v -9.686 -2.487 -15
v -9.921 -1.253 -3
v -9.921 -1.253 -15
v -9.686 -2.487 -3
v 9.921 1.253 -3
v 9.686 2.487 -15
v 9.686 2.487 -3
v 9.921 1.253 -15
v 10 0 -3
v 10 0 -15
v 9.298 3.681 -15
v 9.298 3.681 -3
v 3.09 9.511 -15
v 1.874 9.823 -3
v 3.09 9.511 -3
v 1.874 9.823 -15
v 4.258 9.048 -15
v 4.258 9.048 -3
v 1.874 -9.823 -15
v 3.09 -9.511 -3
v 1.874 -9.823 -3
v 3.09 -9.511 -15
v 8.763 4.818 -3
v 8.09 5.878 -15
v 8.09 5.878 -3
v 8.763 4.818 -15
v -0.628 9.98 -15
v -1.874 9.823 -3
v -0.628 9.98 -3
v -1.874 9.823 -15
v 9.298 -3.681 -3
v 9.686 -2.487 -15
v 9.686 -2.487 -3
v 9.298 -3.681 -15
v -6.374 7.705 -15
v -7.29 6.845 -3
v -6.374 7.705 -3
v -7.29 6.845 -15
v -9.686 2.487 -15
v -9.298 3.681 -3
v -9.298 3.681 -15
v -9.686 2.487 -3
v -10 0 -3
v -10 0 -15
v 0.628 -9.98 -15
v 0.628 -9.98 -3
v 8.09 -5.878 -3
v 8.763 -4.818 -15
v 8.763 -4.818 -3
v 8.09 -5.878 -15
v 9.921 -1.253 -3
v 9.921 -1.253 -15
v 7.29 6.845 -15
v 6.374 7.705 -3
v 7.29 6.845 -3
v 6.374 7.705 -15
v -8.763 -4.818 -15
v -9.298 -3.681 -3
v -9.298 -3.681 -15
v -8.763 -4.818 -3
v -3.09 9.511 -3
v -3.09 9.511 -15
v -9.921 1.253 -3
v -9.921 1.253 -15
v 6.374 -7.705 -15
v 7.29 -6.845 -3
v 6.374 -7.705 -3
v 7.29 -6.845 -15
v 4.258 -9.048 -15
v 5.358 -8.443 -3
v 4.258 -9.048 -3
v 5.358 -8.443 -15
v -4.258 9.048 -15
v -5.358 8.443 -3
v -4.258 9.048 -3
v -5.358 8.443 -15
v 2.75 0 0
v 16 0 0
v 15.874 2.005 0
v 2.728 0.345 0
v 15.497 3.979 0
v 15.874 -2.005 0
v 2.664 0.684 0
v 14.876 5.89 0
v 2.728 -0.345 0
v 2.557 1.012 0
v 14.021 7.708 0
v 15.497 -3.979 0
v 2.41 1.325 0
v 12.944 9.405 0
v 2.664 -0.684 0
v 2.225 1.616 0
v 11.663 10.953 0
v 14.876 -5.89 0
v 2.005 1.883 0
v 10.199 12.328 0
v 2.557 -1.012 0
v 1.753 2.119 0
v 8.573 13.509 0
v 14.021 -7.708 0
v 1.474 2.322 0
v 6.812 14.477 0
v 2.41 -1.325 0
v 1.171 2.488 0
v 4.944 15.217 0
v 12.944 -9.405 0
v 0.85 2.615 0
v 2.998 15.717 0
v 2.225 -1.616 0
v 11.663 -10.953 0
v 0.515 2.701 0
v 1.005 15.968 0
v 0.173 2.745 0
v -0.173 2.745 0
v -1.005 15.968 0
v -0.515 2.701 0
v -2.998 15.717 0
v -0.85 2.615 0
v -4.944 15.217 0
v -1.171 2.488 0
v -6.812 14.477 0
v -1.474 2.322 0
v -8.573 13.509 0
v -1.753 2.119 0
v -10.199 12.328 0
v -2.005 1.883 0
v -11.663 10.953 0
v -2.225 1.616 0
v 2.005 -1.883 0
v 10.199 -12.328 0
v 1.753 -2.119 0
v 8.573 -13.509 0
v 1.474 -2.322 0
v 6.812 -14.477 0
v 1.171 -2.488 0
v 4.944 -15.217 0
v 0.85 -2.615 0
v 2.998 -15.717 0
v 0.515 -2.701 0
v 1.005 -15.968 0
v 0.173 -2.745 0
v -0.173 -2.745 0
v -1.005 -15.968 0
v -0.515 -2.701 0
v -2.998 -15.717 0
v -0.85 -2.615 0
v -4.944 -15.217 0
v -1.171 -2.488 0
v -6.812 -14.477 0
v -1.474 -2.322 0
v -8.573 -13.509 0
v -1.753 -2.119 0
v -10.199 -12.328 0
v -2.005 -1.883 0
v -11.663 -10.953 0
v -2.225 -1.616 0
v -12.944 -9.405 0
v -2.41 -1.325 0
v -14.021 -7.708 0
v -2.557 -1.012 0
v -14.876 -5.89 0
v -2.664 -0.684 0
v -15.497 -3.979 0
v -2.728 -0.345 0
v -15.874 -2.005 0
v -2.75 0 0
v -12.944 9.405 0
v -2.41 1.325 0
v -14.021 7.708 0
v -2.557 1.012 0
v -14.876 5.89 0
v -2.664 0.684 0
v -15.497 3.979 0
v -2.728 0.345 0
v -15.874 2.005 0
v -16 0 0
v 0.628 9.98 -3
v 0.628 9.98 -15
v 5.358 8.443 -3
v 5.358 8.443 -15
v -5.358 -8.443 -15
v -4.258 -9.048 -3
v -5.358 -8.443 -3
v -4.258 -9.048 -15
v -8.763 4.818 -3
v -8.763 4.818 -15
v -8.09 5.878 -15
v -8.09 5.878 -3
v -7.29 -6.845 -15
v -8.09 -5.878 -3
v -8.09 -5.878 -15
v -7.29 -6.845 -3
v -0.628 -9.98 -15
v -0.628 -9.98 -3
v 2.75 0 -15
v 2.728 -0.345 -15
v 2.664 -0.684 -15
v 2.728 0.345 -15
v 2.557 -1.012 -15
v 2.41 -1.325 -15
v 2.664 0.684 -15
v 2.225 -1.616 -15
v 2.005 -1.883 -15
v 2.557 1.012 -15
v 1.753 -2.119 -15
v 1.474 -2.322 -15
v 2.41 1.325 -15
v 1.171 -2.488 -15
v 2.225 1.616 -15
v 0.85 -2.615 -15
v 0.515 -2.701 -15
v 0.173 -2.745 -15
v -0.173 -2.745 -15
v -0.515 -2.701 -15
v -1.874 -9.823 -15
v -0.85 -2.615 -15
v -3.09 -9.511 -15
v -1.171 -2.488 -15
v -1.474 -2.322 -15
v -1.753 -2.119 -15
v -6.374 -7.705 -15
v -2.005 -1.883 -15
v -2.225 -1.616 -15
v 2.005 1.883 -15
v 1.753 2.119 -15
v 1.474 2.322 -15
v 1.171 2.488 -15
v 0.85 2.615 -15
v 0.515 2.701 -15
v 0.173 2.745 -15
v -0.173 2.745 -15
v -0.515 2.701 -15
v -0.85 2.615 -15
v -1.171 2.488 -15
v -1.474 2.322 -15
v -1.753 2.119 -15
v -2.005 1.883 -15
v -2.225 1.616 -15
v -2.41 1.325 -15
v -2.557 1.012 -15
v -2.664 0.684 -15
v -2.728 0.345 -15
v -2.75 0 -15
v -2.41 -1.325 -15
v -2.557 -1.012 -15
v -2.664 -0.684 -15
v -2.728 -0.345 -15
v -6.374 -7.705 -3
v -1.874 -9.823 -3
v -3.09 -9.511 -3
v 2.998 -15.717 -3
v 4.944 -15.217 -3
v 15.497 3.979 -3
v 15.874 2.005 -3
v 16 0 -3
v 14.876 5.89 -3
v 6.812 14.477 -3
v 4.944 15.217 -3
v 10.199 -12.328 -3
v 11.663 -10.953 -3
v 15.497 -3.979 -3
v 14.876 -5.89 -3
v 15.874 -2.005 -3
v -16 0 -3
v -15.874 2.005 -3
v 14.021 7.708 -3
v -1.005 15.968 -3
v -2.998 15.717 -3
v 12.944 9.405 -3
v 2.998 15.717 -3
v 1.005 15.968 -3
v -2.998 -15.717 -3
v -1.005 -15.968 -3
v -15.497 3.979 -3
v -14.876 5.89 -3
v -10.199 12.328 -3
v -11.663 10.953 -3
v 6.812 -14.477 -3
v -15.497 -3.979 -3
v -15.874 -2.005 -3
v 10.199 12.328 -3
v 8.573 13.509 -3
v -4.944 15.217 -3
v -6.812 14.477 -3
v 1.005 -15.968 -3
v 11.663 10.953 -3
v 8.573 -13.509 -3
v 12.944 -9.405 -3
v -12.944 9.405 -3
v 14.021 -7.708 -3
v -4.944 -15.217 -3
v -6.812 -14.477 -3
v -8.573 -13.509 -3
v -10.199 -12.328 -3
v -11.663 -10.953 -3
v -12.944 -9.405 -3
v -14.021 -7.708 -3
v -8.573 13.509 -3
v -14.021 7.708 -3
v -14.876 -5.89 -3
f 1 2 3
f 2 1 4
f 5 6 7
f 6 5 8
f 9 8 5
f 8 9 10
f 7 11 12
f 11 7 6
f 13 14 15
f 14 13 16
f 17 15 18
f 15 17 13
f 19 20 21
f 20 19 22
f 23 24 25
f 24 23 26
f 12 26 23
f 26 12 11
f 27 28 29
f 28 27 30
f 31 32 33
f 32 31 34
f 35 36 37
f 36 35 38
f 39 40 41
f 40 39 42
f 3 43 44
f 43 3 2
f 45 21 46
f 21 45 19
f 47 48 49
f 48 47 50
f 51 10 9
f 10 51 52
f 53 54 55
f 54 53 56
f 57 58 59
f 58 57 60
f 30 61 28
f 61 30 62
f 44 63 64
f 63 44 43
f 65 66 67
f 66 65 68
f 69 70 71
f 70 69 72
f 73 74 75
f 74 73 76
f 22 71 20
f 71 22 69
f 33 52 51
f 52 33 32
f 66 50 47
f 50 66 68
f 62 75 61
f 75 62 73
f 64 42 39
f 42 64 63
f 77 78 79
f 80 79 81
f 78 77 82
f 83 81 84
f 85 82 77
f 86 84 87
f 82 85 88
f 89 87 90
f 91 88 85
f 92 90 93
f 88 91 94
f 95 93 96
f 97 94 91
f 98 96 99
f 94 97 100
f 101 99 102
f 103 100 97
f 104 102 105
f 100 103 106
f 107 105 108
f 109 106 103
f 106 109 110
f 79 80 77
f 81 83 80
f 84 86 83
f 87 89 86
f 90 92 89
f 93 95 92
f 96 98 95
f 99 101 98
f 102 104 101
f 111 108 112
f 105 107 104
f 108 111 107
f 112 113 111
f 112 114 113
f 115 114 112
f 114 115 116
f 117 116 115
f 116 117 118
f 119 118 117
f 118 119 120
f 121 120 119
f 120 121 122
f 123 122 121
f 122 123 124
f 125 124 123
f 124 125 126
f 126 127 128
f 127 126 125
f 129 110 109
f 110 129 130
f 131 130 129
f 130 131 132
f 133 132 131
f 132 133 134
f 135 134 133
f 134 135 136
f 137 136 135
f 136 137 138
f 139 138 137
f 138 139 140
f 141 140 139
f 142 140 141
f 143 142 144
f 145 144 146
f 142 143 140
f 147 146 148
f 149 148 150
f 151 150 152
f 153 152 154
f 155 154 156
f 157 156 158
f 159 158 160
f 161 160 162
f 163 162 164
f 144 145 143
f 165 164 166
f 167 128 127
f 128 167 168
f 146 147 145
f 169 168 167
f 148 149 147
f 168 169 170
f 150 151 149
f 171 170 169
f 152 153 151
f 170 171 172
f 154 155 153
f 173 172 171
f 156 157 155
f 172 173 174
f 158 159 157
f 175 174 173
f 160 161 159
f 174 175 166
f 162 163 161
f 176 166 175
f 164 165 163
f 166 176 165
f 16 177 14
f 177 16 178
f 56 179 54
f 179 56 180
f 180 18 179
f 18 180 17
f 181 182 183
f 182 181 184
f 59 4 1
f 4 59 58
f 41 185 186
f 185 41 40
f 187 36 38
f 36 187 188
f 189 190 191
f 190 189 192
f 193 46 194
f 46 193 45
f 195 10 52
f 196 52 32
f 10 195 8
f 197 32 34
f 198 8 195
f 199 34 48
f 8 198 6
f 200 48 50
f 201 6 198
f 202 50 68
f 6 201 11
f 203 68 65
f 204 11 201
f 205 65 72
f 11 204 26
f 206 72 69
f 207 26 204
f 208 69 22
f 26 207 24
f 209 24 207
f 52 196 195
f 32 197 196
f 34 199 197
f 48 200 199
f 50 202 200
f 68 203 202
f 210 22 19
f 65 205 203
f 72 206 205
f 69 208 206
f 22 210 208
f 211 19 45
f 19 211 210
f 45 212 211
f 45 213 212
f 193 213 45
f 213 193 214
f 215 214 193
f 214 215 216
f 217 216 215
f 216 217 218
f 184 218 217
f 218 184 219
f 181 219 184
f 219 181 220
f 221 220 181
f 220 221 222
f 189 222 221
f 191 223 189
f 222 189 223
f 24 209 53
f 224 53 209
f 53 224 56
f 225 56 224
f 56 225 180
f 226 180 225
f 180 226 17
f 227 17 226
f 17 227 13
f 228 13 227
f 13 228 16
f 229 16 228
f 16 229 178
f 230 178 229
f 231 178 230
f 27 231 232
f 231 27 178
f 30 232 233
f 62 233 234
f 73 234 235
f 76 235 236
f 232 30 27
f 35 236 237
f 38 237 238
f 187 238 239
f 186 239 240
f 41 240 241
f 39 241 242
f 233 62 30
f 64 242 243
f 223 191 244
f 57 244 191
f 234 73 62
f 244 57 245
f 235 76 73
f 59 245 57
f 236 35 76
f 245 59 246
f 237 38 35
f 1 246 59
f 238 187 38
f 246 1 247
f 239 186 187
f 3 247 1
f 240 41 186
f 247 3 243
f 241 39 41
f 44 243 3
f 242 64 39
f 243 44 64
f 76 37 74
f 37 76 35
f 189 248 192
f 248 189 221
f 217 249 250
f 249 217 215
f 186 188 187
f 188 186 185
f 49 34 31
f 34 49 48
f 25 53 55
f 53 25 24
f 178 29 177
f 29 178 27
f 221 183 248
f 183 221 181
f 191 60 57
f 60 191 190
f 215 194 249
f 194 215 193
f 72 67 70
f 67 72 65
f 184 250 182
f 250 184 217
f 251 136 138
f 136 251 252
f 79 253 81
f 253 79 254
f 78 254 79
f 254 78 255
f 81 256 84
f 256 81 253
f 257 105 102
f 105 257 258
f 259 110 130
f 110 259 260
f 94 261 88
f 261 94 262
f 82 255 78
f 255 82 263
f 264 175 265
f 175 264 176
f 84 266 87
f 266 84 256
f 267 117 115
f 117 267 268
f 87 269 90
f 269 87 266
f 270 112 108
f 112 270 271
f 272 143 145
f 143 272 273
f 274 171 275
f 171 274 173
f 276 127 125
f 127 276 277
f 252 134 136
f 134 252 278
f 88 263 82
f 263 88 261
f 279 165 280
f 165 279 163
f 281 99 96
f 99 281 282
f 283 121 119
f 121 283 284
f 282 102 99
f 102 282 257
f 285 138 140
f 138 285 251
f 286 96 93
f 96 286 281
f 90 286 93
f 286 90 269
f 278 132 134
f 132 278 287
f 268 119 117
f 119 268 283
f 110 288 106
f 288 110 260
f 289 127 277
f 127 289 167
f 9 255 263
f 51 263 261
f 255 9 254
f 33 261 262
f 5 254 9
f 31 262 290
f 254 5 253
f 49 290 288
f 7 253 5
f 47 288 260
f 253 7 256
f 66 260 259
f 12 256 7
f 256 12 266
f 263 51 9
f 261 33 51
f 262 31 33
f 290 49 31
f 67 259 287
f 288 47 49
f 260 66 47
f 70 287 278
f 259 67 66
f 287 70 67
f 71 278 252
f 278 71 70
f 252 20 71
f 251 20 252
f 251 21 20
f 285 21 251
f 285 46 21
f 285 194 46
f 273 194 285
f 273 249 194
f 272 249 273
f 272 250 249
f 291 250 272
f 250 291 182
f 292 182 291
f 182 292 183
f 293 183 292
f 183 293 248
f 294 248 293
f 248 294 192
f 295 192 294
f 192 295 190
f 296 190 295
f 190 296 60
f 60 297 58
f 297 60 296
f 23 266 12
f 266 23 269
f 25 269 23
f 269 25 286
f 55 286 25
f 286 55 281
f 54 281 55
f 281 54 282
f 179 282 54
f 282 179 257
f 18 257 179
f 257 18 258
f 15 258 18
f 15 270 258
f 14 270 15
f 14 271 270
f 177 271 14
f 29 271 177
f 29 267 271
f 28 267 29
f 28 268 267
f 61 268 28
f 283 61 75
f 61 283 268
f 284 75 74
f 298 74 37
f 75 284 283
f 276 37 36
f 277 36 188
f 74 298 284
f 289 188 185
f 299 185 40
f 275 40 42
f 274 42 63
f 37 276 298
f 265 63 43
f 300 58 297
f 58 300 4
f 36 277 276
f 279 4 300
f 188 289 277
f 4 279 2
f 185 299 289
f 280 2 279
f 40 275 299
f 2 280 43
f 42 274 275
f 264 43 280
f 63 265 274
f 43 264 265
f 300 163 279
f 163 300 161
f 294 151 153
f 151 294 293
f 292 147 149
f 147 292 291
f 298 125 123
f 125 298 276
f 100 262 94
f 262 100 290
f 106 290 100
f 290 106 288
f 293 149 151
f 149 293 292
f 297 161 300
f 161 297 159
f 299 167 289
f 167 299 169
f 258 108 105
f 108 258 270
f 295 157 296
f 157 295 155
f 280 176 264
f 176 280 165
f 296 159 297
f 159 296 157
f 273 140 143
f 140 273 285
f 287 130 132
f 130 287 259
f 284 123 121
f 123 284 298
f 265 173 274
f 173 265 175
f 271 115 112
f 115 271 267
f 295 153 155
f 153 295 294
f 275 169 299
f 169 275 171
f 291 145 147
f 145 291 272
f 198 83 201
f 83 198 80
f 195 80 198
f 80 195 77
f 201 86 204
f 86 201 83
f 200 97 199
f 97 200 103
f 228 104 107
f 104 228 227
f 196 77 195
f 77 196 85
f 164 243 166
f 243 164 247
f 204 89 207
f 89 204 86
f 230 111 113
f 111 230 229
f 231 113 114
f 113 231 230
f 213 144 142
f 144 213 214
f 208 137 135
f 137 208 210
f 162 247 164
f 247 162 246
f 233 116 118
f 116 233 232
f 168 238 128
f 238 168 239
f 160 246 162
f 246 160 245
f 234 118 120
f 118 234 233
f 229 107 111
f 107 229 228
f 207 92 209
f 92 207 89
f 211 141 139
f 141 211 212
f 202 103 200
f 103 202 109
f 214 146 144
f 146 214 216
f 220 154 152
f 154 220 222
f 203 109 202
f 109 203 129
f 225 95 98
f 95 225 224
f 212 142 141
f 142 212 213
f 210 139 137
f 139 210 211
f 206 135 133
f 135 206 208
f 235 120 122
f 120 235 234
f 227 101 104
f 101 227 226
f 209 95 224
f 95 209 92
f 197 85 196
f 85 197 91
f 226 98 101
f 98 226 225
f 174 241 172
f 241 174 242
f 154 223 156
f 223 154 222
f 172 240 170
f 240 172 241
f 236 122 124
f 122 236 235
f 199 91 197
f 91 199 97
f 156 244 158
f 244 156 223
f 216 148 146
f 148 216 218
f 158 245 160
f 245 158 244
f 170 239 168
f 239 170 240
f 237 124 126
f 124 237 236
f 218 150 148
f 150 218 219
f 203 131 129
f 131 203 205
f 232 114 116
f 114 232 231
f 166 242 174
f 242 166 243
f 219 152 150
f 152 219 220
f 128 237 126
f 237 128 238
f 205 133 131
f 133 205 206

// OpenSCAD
$fn = 50;


difference() {
	union() {
		translate(v = [0, 0, -15.0000000000]) {
			cylinder(h = 15, r = 10.0000000000);
		}
		translate(v = [0, 0, -3.0000000000]) {
			cylinder(h = 3, r = 16.0000000000);
		}
	}
	union() {
		#translate(v = [0, 0, -15]) {
			cylinder(h = 15, r = 2.7500000000);
		}
	}
}
